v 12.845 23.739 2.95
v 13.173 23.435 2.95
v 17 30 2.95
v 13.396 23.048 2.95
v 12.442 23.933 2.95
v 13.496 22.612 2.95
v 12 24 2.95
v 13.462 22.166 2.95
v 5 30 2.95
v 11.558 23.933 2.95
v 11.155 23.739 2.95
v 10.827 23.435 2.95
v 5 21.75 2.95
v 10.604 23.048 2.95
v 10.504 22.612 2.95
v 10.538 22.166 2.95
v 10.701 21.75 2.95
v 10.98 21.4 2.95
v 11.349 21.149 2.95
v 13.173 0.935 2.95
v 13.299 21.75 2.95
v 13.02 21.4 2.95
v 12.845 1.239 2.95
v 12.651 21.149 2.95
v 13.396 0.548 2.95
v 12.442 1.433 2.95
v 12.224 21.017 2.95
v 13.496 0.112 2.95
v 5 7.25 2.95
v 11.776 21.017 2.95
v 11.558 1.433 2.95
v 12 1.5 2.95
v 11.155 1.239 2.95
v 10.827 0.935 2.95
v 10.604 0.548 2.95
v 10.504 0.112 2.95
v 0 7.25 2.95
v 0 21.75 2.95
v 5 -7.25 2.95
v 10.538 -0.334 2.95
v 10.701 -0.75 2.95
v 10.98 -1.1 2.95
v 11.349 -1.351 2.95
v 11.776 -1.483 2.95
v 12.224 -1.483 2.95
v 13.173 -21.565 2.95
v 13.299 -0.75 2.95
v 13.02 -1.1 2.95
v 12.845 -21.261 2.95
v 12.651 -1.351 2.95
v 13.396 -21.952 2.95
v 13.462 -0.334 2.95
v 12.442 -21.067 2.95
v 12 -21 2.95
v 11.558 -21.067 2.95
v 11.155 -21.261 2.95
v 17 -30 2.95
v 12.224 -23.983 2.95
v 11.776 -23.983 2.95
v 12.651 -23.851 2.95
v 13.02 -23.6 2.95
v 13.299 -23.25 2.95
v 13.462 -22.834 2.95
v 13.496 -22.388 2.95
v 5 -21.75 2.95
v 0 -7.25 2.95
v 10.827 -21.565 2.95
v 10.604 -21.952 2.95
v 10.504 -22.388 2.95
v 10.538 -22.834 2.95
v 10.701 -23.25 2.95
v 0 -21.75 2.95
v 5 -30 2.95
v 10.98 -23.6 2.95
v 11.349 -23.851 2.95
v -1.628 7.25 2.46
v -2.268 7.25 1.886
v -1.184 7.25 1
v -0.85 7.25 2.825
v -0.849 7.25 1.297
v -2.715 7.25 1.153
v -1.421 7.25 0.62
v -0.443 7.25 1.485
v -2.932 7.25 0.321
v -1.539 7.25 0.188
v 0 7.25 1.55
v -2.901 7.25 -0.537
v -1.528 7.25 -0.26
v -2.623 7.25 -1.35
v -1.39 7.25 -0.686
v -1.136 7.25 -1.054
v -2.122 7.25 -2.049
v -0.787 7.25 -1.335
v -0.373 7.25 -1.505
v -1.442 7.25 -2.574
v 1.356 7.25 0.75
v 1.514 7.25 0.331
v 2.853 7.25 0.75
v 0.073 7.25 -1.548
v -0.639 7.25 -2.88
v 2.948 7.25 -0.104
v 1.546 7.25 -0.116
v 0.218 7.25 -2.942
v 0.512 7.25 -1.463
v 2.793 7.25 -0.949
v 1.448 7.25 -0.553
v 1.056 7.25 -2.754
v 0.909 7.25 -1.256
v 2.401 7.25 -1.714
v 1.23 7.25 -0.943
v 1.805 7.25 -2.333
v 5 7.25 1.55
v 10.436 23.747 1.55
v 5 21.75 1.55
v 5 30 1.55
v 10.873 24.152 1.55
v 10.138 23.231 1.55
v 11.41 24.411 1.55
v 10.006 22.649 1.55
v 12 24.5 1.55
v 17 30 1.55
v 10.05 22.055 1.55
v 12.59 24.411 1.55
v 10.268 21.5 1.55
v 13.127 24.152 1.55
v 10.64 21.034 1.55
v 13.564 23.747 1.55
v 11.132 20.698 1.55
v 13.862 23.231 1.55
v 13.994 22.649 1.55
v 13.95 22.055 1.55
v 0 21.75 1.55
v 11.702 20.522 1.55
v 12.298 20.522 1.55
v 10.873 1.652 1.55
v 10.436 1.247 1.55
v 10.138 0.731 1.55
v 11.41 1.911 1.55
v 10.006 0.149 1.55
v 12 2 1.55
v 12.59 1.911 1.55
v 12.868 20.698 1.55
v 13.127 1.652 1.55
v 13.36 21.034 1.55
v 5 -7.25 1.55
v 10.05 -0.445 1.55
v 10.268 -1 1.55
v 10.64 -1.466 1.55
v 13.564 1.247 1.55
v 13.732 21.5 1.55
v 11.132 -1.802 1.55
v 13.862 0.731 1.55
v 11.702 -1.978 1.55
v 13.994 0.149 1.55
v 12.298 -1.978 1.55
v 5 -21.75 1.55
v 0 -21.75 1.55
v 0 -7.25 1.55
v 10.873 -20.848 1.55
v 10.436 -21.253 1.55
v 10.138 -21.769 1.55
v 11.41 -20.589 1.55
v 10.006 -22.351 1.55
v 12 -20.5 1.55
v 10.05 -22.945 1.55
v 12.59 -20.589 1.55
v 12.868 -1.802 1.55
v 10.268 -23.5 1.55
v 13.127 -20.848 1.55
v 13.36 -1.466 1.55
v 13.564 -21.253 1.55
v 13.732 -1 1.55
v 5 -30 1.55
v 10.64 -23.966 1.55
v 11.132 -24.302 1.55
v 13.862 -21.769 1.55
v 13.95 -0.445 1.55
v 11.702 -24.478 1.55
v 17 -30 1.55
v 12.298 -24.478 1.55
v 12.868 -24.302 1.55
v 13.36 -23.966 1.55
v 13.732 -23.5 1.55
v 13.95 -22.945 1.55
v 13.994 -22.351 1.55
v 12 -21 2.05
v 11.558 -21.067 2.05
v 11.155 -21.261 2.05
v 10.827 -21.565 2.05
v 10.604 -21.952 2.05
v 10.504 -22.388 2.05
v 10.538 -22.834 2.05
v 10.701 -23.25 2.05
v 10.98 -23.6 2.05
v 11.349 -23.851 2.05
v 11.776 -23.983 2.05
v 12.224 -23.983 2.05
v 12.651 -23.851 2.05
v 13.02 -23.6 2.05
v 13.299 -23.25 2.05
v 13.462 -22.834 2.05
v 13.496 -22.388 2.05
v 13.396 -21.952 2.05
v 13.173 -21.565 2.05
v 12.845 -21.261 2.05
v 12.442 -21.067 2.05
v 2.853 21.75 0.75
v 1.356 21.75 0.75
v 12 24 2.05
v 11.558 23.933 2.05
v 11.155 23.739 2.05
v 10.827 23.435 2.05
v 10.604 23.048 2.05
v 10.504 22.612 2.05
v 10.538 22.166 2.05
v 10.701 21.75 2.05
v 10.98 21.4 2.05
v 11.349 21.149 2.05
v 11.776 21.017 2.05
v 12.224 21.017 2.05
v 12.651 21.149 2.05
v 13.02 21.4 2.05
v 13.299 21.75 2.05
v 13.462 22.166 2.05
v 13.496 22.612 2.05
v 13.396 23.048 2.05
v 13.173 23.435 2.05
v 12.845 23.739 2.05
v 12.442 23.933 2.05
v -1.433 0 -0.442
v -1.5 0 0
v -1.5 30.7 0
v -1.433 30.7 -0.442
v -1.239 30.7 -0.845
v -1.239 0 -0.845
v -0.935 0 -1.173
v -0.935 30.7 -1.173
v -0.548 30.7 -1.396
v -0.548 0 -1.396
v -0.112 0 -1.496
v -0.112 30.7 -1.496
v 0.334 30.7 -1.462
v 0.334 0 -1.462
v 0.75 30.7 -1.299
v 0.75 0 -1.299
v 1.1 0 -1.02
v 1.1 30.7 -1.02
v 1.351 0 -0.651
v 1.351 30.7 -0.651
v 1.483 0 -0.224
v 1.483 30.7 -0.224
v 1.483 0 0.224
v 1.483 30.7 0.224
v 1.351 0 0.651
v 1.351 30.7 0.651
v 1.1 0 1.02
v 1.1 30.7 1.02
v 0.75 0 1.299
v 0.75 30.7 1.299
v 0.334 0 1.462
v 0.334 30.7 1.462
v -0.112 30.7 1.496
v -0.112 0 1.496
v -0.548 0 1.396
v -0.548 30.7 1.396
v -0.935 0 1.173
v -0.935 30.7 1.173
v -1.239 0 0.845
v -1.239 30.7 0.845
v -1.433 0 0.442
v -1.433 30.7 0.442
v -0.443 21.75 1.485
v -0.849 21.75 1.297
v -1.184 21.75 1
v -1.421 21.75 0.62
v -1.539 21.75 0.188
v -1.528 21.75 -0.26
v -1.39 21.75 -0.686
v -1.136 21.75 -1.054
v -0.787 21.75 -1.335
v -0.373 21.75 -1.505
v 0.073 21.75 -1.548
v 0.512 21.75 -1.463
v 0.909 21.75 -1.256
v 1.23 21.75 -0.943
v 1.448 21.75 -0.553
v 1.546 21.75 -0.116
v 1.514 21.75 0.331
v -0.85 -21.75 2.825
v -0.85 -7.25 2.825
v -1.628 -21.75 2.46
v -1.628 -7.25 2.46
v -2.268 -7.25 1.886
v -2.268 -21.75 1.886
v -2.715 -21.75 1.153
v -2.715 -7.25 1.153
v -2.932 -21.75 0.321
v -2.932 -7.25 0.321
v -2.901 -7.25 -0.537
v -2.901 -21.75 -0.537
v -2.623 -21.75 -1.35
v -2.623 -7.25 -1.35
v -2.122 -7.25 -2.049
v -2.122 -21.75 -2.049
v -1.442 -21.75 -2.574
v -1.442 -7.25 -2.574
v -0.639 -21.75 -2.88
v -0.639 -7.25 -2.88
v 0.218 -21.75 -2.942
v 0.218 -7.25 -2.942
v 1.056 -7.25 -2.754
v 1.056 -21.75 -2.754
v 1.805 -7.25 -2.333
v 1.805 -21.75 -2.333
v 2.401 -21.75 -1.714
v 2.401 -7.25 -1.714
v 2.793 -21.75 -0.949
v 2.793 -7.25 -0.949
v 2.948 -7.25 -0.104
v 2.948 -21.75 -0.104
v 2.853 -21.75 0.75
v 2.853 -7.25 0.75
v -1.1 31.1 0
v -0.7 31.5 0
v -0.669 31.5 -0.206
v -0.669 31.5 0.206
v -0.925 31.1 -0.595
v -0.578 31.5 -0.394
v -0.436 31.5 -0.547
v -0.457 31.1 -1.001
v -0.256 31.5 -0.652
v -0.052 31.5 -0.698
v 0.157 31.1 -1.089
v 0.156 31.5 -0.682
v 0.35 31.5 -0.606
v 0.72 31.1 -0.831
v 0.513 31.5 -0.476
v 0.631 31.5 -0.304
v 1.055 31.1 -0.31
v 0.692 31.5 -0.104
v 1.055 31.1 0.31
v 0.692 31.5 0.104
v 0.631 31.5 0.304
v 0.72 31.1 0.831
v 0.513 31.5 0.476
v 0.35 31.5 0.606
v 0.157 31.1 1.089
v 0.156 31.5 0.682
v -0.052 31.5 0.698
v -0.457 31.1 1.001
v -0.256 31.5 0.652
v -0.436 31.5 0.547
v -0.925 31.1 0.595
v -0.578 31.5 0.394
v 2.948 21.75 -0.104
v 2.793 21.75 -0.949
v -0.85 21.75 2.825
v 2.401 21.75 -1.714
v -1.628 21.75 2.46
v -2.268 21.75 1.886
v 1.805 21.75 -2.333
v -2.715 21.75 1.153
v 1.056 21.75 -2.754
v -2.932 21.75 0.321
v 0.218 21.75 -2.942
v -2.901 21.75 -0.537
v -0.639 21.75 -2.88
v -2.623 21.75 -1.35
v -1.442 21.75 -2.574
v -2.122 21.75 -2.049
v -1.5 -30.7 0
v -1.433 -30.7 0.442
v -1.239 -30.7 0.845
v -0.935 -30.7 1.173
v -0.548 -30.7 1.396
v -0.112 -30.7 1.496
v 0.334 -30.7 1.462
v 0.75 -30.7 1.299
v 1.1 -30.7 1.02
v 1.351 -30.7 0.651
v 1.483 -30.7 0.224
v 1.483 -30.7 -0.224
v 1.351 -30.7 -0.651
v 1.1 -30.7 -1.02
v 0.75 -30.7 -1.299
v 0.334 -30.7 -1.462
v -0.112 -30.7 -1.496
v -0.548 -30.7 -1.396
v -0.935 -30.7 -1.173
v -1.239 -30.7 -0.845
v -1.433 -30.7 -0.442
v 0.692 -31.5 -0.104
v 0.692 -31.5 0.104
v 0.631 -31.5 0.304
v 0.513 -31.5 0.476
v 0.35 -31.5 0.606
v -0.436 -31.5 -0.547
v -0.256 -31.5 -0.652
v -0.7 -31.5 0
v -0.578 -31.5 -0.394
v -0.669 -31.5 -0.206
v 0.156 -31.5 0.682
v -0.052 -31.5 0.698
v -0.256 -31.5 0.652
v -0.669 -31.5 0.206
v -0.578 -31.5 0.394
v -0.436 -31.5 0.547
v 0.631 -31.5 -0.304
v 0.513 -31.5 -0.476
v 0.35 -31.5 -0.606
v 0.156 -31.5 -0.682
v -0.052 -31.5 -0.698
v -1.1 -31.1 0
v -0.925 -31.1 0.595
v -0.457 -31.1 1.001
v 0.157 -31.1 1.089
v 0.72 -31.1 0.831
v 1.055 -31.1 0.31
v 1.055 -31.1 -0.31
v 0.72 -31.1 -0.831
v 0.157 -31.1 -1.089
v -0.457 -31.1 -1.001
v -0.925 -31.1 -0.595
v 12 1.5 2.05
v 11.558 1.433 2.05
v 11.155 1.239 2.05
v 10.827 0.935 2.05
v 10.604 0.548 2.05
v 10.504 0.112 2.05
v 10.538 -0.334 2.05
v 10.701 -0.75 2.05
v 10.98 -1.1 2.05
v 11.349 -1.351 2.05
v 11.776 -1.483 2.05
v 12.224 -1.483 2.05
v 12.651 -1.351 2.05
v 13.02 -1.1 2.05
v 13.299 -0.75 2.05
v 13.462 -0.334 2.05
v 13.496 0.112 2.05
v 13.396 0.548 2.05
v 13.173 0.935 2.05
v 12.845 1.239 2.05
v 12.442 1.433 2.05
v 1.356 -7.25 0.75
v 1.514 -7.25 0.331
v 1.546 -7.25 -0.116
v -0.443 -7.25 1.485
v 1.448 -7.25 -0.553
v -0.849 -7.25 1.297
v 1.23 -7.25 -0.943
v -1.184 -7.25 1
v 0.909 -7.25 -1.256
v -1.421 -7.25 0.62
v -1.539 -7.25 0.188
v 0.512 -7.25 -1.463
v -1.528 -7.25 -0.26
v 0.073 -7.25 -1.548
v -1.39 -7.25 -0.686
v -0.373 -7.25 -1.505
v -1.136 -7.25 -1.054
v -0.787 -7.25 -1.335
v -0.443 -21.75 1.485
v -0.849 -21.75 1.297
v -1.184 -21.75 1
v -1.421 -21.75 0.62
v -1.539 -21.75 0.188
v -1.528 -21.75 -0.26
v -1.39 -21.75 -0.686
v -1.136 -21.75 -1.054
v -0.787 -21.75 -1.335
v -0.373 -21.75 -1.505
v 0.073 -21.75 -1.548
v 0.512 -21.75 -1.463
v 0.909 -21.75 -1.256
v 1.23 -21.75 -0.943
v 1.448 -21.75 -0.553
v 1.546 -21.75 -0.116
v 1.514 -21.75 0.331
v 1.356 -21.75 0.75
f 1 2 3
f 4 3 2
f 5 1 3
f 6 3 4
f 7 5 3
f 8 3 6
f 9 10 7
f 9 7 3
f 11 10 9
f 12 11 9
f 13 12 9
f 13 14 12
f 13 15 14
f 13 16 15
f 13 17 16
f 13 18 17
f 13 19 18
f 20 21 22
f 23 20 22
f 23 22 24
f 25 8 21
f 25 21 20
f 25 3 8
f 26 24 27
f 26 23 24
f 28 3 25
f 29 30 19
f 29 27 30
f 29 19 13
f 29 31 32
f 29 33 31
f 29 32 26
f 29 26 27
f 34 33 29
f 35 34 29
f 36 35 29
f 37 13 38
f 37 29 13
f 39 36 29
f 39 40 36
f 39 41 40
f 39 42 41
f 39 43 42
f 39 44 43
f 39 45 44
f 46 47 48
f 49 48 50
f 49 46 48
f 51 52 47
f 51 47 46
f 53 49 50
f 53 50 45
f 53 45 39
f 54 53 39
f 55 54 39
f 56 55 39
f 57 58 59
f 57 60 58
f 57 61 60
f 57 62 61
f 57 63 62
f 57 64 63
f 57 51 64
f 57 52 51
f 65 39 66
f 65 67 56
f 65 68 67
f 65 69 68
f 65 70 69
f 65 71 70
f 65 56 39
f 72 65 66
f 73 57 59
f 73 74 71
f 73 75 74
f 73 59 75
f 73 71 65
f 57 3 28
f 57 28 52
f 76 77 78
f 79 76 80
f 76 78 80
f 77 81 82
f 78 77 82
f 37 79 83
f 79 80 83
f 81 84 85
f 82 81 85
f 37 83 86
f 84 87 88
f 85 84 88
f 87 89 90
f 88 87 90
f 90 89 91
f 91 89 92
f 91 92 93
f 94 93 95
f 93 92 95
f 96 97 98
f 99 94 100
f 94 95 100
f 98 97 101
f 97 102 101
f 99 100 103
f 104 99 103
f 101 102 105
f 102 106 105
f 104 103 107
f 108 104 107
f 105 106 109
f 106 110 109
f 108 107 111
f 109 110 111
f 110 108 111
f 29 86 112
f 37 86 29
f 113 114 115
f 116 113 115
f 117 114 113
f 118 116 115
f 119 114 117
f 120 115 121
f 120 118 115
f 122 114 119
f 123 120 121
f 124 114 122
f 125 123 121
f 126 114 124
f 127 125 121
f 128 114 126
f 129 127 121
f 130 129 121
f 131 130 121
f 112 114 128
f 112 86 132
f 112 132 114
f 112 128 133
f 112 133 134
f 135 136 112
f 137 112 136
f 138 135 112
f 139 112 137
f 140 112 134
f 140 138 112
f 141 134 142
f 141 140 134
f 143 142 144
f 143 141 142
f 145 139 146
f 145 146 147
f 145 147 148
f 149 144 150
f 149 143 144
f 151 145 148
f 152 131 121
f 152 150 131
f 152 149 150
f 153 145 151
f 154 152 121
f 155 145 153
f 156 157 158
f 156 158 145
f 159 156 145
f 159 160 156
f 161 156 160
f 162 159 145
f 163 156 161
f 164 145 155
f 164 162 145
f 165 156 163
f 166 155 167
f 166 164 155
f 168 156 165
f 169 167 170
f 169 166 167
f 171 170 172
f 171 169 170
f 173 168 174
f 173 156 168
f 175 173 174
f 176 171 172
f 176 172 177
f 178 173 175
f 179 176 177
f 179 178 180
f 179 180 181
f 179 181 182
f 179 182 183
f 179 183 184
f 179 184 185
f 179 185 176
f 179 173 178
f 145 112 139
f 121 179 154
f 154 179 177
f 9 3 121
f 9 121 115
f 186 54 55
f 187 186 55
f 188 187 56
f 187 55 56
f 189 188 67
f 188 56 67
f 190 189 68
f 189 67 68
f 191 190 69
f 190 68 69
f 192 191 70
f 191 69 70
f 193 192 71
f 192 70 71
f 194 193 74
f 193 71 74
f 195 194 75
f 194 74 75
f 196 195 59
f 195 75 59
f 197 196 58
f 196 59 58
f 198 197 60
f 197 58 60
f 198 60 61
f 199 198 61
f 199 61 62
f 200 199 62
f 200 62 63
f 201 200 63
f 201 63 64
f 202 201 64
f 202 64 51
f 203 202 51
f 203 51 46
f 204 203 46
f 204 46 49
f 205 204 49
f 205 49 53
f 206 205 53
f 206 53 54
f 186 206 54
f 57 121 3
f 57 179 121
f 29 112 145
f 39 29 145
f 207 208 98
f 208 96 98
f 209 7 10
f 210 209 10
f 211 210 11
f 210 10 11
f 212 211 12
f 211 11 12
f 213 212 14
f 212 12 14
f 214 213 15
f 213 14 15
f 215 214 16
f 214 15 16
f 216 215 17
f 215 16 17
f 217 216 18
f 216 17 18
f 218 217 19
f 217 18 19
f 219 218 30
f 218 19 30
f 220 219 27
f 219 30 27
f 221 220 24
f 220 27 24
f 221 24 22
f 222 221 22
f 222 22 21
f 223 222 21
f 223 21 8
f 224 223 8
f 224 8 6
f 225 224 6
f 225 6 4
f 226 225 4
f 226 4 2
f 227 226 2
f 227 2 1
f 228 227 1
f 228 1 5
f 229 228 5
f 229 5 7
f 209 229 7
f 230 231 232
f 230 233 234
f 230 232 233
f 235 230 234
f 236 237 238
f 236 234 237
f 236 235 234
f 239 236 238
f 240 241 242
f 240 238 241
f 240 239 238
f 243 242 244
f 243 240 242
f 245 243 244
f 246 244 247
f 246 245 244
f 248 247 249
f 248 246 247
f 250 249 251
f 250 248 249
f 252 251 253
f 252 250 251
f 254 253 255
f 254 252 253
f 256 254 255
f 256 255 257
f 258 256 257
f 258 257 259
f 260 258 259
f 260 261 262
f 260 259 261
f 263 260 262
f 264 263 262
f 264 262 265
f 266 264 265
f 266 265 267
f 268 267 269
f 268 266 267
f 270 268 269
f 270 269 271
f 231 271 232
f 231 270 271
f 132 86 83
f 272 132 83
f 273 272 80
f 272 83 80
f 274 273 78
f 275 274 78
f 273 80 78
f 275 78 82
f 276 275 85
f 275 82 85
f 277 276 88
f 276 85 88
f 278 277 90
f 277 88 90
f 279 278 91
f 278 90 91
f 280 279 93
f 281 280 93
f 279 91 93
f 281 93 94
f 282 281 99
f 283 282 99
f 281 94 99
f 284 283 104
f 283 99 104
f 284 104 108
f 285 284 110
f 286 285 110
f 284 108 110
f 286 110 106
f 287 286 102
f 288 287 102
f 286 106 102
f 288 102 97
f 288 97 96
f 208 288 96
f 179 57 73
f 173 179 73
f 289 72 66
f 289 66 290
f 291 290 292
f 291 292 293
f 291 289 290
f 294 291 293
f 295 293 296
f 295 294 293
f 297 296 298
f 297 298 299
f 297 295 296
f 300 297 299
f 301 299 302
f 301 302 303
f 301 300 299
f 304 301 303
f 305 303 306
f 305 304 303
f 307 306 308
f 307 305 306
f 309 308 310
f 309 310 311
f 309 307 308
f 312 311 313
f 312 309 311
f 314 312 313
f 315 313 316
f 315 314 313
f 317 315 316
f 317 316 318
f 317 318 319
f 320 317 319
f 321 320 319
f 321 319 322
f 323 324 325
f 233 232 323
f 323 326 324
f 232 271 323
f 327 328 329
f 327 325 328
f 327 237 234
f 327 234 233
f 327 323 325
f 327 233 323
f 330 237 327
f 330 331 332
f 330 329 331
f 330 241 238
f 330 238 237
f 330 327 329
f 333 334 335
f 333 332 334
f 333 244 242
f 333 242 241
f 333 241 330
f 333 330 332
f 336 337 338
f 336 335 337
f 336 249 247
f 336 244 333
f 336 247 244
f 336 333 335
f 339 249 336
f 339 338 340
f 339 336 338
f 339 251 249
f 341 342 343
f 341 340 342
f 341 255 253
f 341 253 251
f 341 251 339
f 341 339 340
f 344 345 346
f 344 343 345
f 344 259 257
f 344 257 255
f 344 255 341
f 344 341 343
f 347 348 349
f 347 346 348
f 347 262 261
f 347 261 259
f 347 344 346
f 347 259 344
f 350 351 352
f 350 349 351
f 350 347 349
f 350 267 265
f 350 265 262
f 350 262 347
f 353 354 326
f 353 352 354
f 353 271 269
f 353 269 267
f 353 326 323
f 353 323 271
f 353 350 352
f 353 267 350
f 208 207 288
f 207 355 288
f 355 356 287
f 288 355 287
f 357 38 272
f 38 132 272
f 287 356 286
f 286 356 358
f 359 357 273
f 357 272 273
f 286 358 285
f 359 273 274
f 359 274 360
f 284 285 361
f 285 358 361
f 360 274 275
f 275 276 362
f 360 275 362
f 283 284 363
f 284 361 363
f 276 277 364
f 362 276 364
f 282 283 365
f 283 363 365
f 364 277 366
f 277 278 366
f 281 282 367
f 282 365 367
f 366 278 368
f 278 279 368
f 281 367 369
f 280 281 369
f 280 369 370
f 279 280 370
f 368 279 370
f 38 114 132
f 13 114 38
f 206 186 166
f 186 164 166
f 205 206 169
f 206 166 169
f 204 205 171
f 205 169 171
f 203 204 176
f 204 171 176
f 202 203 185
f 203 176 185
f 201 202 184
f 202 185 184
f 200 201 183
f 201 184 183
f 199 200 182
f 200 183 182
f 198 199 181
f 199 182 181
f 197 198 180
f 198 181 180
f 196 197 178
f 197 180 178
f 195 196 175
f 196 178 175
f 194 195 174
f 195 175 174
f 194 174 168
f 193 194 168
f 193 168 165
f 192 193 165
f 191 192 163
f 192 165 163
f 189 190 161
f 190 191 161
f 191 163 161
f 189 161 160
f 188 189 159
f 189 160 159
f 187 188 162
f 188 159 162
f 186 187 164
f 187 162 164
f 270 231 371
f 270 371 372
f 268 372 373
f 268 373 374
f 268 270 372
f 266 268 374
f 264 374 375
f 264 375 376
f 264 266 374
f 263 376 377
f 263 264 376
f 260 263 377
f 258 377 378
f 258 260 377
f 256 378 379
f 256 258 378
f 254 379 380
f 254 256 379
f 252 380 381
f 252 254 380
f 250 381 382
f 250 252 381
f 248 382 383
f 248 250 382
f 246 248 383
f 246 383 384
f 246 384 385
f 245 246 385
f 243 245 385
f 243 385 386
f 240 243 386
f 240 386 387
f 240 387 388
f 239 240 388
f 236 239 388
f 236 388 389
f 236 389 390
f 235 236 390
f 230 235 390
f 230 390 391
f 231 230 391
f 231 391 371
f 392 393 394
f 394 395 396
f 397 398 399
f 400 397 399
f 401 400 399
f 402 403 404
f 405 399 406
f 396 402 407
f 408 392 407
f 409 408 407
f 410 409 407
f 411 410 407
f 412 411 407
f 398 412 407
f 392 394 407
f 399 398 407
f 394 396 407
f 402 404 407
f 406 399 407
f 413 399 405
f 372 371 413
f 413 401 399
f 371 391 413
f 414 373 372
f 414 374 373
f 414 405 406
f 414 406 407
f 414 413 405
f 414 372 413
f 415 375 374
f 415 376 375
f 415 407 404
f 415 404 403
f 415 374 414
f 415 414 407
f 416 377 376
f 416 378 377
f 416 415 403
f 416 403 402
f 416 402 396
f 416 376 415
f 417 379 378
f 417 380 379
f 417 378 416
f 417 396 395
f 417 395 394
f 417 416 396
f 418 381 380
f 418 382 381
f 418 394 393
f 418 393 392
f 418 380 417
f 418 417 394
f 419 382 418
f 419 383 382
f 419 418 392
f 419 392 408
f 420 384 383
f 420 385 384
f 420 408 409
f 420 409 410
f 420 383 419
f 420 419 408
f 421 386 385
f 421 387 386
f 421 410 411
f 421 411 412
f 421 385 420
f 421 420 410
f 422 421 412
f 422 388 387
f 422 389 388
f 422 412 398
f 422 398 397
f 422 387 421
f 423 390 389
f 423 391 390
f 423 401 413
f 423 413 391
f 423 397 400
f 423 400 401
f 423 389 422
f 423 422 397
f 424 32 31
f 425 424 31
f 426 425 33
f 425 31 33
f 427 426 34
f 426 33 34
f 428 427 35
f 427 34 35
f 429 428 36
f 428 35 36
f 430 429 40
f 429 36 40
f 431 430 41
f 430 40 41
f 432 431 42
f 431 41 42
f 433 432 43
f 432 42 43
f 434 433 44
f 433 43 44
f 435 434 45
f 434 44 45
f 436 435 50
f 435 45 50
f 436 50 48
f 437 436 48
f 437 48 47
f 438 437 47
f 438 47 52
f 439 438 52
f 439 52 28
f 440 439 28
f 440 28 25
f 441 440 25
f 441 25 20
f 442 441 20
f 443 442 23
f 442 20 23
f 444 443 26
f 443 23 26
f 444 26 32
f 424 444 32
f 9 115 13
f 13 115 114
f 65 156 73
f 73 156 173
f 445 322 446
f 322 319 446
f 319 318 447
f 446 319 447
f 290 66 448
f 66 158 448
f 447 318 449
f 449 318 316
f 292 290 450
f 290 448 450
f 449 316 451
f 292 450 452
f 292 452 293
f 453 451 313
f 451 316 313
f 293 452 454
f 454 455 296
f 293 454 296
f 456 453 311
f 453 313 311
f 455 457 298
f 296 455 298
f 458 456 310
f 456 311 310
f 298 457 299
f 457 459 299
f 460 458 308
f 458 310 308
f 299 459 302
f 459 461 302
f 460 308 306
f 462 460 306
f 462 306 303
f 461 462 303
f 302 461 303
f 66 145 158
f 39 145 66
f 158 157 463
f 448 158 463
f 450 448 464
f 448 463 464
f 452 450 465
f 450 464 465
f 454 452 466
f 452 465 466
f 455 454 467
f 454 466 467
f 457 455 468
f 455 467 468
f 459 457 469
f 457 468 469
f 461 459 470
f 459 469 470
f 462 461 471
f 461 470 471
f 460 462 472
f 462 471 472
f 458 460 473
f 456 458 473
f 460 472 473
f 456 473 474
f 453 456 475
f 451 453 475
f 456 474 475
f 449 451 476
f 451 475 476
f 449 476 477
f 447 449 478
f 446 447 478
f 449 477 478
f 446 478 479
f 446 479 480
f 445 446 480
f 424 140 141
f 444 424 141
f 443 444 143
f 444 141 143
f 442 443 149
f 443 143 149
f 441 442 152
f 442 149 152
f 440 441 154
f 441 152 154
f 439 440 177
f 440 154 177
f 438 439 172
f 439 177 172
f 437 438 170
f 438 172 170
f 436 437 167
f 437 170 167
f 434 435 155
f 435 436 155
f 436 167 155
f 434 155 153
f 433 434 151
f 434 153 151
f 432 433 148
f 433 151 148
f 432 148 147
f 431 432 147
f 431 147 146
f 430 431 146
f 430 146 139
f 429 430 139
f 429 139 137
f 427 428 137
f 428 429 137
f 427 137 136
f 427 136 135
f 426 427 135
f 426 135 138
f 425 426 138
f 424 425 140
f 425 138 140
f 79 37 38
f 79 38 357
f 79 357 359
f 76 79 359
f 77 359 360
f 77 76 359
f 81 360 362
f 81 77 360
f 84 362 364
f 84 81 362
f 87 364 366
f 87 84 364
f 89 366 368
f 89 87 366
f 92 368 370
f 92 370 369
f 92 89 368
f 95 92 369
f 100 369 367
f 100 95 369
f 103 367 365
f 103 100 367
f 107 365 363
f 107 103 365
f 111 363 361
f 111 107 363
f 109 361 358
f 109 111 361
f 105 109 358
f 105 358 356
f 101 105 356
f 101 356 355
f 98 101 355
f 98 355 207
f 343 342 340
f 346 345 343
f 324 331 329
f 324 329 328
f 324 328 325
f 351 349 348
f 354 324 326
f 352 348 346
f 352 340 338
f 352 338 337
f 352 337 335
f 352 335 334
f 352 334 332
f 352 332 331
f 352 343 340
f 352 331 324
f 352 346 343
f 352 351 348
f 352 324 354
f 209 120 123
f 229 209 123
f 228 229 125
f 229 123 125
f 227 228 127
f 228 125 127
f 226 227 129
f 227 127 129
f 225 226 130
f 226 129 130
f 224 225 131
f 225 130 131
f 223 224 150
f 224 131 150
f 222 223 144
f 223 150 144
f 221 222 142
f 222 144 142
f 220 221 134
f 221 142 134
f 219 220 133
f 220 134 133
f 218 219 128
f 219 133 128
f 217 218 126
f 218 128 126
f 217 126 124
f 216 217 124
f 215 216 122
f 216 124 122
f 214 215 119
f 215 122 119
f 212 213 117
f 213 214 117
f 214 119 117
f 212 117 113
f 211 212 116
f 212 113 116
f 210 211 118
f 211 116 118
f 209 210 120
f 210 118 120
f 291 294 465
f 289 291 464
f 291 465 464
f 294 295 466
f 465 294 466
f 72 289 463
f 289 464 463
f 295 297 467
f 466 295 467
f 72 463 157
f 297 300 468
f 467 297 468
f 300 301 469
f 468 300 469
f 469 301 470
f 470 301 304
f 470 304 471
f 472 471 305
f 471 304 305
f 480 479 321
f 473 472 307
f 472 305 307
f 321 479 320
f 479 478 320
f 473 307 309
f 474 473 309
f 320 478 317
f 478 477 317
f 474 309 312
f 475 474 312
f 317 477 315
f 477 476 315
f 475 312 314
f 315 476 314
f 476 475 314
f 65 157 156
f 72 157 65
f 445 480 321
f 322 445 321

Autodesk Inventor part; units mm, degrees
ref_plane "YZ Plane" through (0, 0, 0) normal (1, 0, 0) x (0, 1, 0)
ref_plane "XZ Plane" through (0, 0, 0) normal (0, 1, 0) x (-1, 0, 0)
ref_plane "XY Plane" through (0, 0, 0) normal (0, 0, 1) x (1, 0, 0)
sketch "Skizze1" plane through (0, 0, 0) normal (0, 1, 0) x (-1, 0, 0)
  line L0 (0, 0) -> (0, 79.9753) construction
  line L1 (0, 0) -> (-80.4332, 0) construction
  line L2 (0, 0) -> (80.1339, 0) construction
  line L3 (0, 0) -> (0, -79.3949) construction
  line L4 (0, 1.55) -> (-17, 1.55)
  line L5 (-17, 1.55) -> (-17, 2.95)
  line L6 (-17, 2.95) -> (0, 2.95)
  arc A0 (-1.3565, 0.75) -> (0, 1.55) centre (0, 0) ccw
  arc A1 (-2.8531, 0.75) -> (0, 2.95) centre (0, 0) ccw
  line L7 (-1.3565, 0.75) -> (-2.8531, 0.75)
  circle A2 centre (0, 0) radius 1.5
  dimension "d0" = 1.4
  dimension "d1" = 5.9
  dimension "d2" = 0.8
  dimension "d3" = 19.95
  dimension "d21" = 0.05
  dimension "d27" = 17
extrude "Extrusion1" add sketch "Skizze1" along normal mid plane 60 contours L4 L5 L6 A1 L7 A0
sketch "Skizze3" plane through (0, 0, 0) normal (0, 0, 1) x (1, 0, 0)
  line L0 (5, -7.25) -> (-9.5, -7.25)
  line L1 (-9.5, -7.25) -> (-9.5, 7.25)
  line L2 (-9.5, 7.25) -> (5, 7.25)
  line L3 (5, 7.25) -> (5, -7.25)
  line L4 (17, 30) -> (17, -30) construction
  line L5 (-11.8, 0) -> (21.8, 0) construction
  point P0 (0, 0)
  dimension "d6" = 12
  dimension "d7" = 14.5
  dimension "d8" = 7.25
  dimension "d9" = 14.5
extrude "Extrusion2" cut sketch "Skizze3" along normal through all both and the other way through all
sketch "Skizze4" plane through (17, 30, 1.55) normal (0, 0, -1) x (-1, 0, 0)
  line L0 (17, -72) -> (17, 12) projected
  line L1 (-3.99, -30) -> (23.94, -30) construction
  line L2 (5, -7.5) -> (5, -52.5) construction
  line L3 (0, 0) -> (0, -60) construction
  point P0 (17, -30)
  point P1 (5, -30)
  dimension "d12" = 45
  dimension "d13" = 5
hole "Bohrung1" at (12, 22.5, 1.55) at (12, -22.5, 1.55) at (12, 0, 1.55) direction (0, 0, 1) diameter 3 end through all countersink diameter 4 countersink angle 90
extrude "Extrusion3" add sketch "Skizze1" along normal mid plane 63 separate body contours A2
chamfer "Fase1" distance 0.8 angle 45 2 edges at (1.5, 31.5, 0) (1.5, -31.5, 0)
pattern_linear "Rechteckige Anordnung1" count 3 spacing 29 along (0, 1, 0) of "Extrusion2" first direction both ways yes bodies 1
equation "\"d8\" = 0.5 * d7"
equation "\"d9\" = d7"
properties material "Ms58"
